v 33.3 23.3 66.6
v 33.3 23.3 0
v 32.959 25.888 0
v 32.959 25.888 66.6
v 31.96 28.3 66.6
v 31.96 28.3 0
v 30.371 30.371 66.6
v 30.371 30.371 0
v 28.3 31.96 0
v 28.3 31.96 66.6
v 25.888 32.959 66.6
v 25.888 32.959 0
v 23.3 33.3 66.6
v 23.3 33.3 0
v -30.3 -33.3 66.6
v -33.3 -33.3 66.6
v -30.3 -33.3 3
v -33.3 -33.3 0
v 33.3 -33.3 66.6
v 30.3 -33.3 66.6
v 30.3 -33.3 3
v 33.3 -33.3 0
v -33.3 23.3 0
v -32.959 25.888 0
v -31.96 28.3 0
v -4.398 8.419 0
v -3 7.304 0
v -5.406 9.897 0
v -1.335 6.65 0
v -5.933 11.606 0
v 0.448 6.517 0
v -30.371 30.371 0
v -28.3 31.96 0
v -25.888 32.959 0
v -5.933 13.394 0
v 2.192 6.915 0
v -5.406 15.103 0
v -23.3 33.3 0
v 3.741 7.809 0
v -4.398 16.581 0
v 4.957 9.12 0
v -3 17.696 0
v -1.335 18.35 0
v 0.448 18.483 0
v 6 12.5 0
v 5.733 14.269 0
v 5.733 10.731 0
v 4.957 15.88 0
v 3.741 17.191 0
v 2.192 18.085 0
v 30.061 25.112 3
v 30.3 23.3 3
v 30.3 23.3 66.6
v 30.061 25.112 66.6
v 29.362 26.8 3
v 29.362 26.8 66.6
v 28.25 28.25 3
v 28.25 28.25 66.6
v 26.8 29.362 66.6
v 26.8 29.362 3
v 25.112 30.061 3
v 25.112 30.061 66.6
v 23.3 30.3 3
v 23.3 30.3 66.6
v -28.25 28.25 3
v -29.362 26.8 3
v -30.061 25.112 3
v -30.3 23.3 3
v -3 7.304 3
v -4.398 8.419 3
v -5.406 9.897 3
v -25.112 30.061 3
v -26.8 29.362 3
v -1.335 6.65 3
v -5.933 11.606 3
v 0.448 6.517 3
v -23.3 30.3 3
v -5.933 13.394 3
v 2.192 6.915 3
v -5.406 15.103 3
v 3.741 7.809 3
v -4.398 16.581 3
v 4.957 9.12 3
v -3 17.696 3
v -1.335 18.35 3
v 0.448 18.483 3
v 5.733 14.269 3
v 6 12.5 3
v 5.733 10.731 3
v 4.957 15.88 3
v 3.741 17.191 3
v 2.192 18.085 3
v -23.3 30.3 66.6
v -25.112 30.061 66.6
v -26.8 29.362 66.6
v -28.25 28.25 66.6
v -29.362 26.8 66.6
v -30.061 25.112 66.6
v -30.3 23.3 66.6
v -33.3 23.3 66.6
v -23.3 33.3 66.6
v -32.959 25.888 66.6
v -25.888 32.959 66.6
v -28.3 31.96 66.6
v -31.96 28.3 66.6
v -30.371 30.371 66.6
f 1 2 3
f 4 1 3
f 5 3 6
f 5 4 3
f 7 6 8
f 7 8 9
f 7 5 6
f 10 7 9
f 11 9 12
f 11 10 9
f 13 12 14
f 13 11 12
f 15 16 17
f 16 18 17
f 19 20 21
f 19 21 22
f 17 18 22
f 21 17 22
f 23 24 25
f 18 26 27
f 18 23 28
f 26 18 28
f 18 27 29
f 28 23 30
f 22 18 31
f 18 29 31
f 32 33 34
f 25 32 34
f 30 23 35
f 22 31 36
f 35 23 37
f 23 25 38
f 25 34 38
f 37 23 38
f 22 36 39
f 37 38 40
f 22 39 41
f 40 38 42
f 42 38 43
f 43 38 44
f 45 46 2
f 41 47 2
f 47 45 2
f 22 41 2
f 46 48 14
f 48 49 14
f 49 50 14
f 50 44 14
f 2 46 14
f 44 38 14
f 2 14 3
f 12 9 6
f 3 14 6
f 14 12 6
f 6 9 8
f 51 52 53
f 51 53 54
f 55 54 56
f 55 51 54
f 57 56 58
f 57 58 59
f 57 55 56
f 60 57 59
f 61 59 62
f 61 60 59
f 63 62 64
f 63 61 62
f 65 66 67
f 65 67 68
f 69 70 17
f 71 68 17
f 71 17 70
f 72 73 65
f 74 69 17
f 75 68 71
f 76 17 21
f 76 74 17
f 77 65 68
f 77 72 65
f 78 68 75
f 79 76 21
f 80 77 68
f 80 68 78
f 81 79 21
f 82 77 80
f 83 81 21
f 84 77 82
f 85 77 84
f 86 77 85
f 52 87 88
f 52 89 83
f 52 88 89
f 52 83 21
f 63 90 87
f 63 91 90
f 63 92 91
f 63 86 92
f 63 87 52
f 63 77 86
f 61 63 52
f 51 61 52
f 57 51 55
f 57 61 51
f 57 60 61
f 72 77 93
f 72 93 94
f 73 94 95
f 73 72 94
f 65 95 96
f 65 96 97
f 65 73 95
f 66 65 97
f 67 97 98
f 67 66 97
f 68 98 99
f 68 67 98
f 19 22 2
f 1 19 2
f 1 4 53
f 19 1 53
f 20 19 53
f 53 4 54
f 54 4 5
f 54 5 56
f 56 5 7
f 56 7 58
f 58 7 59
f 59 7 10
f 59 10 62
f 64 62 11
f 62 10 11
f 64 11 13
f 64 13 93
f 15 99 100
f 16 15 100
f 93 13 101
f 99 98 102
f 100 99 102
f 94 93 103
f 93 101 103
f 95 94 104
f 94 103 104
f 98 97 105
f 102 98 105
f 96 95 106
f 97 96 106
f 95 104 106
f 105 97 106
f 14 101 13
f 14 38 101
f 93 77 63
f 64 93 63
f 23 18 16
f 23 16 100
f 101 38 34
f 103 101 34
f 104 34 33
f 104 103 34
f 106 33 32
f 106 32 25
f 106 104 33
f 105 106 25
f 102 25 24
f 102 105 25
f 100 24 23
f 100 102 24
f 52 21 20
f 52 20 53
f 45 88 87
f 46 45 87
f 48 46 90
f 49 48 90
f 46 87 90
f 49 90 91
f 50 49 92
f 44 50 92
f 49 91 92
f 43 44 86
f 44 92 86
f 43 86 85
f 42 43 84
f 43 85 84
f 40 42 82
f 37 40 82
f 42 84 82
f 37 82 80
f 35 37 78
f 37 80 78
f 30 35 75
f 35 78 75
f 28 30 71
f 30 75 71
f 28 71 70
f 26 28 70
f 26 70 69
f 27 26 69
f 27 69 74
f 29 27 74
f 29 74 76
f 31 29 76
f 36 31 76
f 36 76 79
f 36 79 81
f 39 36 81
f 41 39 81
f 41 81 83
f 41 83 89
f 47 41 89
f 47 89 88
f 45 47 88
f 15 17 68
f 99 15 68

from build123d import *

# Parameters (mm, degrees)
SCHIZZO1_W                   = 66.6
SCHIZZO1_H                   = 66.6
ESTRUSIONE_ESTRUSIONE1_DEPTH = 3
SCHIZZO2_W                   = 3
SCHIZZO2_H                   = 66.6
ESTRUSIONE_ESTRUSIONE2_DEPTH = 63.6
SCHIZZO6_W                   = 60.6
SCHIZZO6_H                   = 3
ESTRUSIONE_ESTRUSIONE4_DEPTH = 63.6
TAGLIO_ESTRUSIONE2_DEPTH     = 66.6
ESTRUSIONE_ESTRUSIONE5_DEPTH = 63.6
SCHIZZO9_R                   = 6
TAGLIO_ESTRUSIONE4_DEPTH     = 94.9479111


with BuildPart() as part:
    # Schizzo1 → Estrusione-Estrusione1 (new body)
    with BuildSketch(Plane.XY):
        Rectangle(SCHIZZO1_W, SCHIZZO1_H)
    extrude(amount=ESTRUSIONE_ESTRUSIONE1_DEPTH)

    # Schizzo2 → Estrusione-Estrusione2 (add)
    with BuildSketch(Plane.XY.offset(3)):
        with Locations((-31.8, 0)):
            Rectangle(SCHIZZO2_W, SCHIZZO2_H)
        with Locations((31.8, 0)):
            Rectangle(SCHIZZO2_W, SCHIZZO2_H)
    extrude(amount=ESTRUSIONE_ESTRUSIONE2_DEPTH)

    # Schizzo6 → Estrusione-Estrusione4 (add)
    with BuildSketch(Plane.XY.offset(3)):
        with Locations((0, 31.8)):
            Rectangle(SCHIZZO6_W, SCHIZZO6_H)
    extrude(amount=ESTRUSIONE_ESTRUSIONE4_DEPTH)

    # Schizzo7 → Taglio-Estrusione2 (cut)
    with BuildSketch(Plane.XY.offset(66.6)):
        with BuildLine():
            Line((-33.3, 23.3), (-33.3, 33.3))
            Line((-33.3, 33.3), (-23.3, 33.3))
            ThreePointArc((-23.3, 33.3), (-30.371067812, 30.371067812), (-33.3, 23.3))
        make_face()
        with BuildLine():
            Line((33.3, 33.3), (33.3, 23.3))
            ThreePointArc((33.3, 23.3), (30.371067812, 30.371067812), (23.3, 33.3))
            Line((23.3, 33.3), (33.3, 33.3))
        make_face()
    extrude(amount=-TAGLIO_ESTRUSIONE2_DEPTH, mode=Mode.SUBTRACT)

    # Schizzo8 → Estrusione-Estrusione5 (add)
    with BuildSketch(Plane.XY.offset(3)):
        with BuildLine():
            Line((-30.3, 23.3), (-30.3, 30.3))
            Line((-30.3, 30.3), (-23.3, 30.3))
            ThreePointArc((-23.3, 30.3), (-28.249747468, 28.249747468), (-30.3, 23.3))
        make_face()
        with BuildLine():
            Line((30.3, 30.3), (30.3, 23.3))
            ThreePointArc((30.3, 23.3), (28.249747468, 28.249747468), (23.3, 30.3))
            Line((23.3, 30.3), (30.3, 30.3))
        make_face()
    extrude(amount=ESTRUSIONE_ESTRUSIONE5_DEPTH)

    # Schizzo9 → Taglio-Estrusione4 (cut, through all)
    with BuildSketch(Plane(origin=(0, 27.3, 3), x_dir=(1, 0, 0), z_dir=(0, 0, 1))):
        with Locations((0, -14.8)):
            Circle(SCHIZZO9_R)
    extrude(amount=-TAGLIO_ESTRUSIONE4_DEPTH, mode=Mode.SUBTRACT)


solid = part.part
